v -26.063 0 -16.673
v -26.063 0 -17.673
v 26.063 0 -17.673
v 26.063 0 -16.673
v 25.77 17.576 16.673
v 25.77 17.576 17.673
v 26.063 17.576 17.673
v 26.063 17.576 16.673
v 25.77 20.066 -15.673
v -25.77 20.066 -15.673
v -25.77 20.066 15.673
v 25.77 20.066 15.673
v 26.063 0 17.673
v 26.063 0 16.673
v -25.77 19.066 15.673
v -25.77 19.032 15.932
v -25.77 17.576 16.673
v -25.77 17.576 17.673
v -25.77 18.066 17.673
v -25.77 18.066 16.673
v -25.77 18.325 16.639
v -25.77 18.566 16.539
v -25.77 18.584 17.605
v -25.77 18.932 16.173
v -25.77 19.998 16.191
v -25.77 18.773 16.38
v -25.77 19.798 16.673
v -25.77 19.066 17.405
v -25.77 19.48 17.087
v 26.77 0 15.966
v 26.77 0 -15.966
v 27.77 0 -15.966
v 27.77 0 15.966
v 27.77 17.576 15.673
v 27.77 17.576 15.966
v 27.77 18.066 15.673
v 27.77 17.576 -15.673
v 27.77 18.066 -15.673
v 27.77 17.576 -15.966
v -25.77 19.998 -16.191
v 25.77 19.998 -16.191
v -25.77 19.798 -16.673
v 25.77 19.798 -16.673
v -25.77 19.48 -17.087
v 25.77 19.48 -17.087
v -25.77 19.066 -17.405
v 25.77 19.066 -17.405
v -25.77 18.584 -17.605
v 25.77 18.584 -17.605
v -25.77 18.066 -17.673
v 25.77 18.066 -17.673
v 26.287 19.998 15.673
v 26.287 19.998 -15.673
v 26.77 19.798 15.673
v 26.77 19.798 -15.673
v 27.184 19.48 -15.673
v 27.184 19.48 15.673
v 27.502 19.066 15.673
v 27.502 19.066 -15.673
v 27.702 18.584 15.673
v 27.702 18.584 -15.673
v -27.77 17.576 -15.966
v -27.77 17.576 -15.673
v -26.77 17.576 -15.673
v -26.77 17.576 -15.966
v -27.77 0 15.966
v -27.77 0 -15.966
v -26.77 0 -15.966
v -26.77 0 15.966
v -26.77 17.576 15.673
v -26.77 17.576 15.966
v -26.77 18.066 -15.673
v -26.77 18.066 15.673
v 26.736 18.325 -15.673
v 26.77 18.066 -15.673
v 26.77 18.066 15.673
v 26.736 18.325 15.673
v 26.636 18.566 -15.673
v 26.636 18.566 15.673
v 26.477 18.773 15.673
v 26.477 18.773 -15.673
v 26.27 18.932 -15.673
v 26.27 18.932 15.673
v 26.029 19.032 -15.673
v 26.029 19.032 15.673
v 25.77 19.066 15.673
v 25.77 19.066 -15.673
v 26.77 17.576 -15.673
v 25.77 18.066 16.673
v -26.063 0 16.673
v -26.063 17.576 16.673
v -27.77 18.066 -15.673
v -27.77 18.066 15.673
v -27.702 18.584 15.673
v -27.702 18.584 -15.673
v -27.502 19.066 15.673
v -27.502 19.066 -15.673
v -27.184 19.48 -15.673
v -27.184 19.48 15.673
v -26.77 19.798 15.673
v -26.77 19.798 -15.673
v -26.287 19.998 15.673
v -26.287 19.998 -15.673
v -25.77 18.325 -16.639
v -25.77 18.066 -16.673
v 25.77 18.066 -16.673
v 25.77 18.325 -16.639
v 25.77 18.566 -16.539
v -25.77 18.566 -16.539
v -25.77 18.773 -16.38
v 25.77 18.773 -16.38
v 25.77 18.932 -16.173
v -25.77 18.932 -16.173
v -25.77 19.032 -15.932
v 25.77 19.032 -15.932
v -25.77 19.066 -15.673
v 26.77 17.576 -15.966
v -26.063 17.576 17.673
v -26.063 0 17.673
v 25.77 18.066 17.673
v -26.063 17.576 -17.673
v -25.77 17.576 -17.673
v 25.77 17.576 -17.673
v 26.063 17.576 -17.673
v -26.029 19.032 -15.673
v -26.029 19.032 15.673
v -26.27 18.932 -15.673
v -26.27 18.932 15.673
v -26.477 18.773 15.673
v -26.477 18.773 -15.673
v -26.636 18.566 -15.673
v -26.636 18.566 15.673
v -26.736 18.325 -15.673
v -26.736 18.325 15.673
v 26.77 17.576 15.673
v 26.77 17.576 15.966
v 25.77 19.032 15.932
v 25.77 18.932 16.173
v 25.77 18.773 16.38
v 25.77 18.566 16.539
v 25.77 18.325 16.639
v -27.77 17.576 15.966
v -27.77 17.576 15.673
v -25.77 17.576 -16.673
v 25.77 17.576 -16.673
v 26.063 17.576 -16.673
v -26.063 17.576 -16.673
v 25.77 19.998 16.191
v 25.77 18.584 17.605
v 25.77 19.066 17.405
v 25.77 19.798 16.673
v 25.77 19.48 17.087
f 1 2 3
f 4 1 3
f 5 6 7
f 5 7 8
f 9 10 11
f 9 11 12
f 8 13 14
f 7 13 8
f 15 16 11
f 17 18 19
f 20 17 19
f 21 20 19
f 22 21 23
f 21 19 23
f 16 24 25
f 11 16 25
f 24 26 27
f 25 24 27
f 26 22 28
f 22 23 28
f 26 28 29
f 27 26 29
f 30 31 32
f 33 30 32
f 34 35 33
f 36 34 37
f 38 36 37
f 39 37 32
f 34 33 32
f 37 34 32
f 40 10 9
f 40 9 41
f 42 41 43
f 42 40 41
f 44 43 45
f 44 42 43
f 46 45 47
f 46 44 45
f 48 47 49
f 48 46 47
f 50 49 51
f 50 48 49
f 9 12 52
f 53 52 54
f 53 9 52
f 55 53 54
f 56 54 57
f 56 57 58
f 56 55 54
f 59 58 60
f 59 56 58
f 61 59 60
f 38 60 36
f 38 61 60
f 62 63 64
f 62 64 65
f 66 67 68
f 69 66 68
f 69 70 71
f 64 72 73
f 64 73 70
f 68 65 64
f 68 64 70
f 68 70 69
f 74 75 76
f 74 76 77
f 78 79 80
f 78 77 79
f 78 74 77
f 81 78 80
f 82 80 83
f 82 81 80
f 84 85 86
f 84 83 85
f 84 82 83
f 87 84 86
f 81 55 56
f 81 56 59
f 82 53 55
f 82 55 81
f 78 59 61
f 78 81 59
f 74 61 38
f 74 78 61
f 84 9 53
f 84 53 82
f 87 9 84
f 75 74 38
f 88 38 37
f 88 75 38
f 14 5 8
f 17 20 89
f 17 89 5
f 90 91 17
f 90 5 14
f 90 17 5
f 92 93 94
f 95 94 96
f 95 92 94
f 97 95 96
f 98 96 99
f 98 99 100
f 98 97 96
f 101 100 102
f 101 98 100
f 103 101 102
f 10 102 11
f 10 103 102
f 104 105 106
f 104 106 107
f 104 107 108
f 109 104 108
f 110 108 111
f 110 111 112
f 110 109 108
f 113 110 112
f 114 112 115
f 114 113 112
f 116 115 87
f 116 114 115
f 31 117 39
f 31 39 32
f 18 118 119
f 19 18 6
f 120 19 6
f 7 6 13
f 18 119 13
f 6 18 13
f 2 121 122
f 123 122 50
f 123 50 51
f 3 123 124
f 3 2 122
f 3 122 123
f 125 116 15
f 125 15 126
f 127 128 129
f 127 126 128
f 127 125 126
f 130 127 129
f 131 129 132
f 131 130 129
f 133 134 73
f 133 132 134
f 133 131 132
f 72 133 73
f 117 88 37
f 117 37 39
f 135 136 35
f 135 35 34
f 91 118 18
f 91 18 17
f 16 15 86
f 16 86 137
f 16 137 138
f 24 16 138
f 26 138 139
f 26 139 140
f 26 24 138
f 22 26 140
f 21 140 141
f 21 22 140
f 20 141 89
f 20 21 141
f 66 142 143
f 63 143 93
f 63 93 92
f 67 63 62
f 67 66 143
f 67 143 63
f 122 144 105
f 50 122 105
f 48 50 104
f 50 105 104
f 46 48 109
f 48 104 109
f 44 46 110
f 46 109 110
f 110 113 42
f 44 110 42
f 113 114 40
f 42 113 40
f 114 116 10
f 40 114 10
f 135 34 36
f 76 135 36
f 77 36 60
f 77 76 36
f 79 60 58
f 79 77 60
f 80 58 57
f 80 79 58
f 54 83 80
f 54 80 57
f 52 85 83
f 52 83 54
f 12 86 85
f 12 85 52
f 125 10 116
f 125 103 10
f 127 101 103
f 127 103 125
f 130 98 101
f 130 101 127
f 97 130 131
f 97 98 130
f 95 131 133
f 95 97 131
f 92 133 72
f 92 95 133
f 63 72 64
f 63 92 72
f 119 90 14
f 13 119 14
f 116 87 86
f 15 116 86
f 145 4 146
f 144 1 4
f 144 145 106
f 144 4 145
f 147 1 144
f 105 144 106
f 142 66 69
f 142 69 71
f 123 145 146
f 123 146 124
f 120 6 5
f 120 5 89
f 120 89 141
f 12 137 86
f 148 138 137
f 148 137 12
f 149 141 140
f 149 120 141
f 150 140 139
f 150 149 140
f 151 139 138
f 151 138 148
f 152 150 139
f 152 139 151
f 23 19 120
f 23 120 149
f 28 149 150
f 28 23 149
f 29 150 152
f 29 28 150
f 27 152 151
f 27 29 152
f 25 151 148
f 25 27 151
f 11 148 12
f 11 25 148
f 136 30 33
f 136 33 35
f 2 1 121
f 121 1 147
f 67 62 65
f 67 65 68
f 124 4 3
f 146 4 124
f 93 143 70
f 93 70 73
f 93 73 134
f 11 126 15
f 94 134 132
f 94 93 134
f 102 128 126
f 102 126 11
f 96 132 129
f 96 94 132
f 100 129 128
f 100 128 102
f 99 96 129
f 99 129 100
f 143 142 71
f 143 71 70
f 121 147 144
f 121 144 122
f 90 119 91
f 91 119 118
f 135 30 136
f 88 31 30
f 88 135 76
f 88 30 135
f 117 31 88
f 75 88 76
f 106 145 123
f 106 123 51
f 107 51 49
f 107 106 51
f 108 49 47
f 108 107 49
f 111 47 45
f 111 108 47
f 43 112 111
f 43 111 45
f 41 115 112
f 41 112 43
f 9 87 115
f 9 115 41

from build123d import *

# Parameters (mm, degrees)
SKETCH2_W                = 55.53941402
SKETCH2_H                = 35.345852224
BOSS_EXTRUDE1_DEPTH      = 20.066
CONVERT_SOLID10_START    = -25.769706946
CONVERT_SOLID10_DEPTH    = 51.539413892
CONVERT_SOLID10_START_2  = -29
CONVERT_SOLID10_2_DEPTH  = 58
CONVERT_SOLID10_3_DEPTH  = 58
CONVERT_SOLID10_4_DEPTH  = 2.937399826
CONVERT_SOLID10_START_3  = 26.062600174
CONVERT_SOLID10_5_DEPTH  = 2.937399826
CONVERT_SOLID10_START_4  = -26.062600174
CONVERT_SOLID10_6_DEPTH  = 0.292893228
CONVERT_SOLID10_START_5  = 25.769706946
CONVERT_SOLID10_7_DEPTH  = 0.292893228
CONVERT_SOLID10_START_6  = -15.965819276
CONVERT_SOLID10_8_DEPTH  = 31.931638552
CONVERT_SOLID10_9_DEPTH  = 0.292893228
CONVERT_SOLID10_START_7  = 15.672926048
CONVERT_SOLID10_10_DEPTH = 0.292893228


with BuildPart() as part:
    # Sketch2 → Boss-Extrude1 (new body)
    with BuildSketch(Plane(origin=(0, 0, 0), x_dir=(1, 0, 0), z_dir=(0, 1, 0))):
        Rectangle(SKETCH2_W, SKETCH2_H)
    extrude(amount=BOSS_EXTRUDE1_DEPTH)

    # Convert-Solid10: read off the stored shape, not the designer's step
    # Convert-Solid10 outline → Convert-Solid10 (cut)
    with BuildSketch(Plane.YZ.offset(CONVERT_SOLID10_START)):
        with BuildLine():
            Line((0, 16.67292608), (0, -16.67292608))
            Line((0, -16.67292608), (18.065999936, -16.67292608))
            ThreePointArc((18.065999936, -16.67292608), (18.77310674, -16.380032852), (19.065999968, -15.672926048))
            Line((19.065999968, -15.672926048), (19.065999968, 15.672926048))
            ThreePointArc((19.065999968, 15.672926048), (18.77310674, 16.380032852), (18.065999936, 16.67292608))
            Line((18.065999936, 16.67292608), (0, 16.67292608))
        make_face()
    extrude(amount=CONVERT_SOLID10_DEPTH, mode=Mode.SUBTRACT)

    # Convert-Solid10 2 outline → Convert-Solid10 2 (cut)
    with BuildSketch(Plane.YZ.offset(CONVERT_SOLID10_START_2)):
        with BuildLine():
            Line((0, 15.965819276), (17.57580092, 15.965819276))
            Line((17.57580092, 15.965819276), (17.57580092, 15.672926048))
            Line((17.57580092, 15.672926048), (19.065999968, 15.672926048))
            ThreePointArc((19.065999968, 15.672926048), (18.77310674, 16.380032852), (18.065999936, 16.67292608))
            Line((18.065999936, 16.67292608), (0, 16.67292608))
            Line((0, 16.67292608), (0, 15.965819276))
        make_face()
        with BuildLine():
            Line((17.57580092, -15.965819276), (0, -15.965819276))
            Line((0, -15.965819276), (0, -16.67292608))
            Line((0, -16.67292608), (18.065999936, -16.67292608))
            ThreePointArc((18.065999936, -16.67292608), (18.77310674, -16.380032852), (19.065999968, -15.672926048))
            Line((19.065999968, -15.672926048), (17.57580092, -15.672926048))
            Line((17.57580092, -15.672926048), (17.57580092, -15.965819276))
        make_face()
    extrude(amount=CONVERT_SOLID10_2_DEPTH, mode=Mode.SUBTRACT)

    # Convert-Solid10 3 outline → Convert-Solid10 3 (cut)
    with BuildSketch(Plane.YZ.offset(CONVERT_SOLID10_START_2)):
        with BuildLine():
            Line((20.066, 17.672926112), (18.065999936, 17.672926112))
            ThreePointArc((18.065999936, 17.672926112), (19.480213544, 17.087139656), (20.066, 15.672926048))
            Line((20.066, 15.672926048), (20.066, 17.672926112))
        make_face()
        with BuildLine():
            Line((20.066, -17.672926112), (20.066, -15.672926048))
            ThreePointArc((20.066, -15.672926048), (19.480213544, -17.087139656), (18.065999936, -17.672926112))
            Line((18.065999936, -17.672926112), (20.066, -17.672926112))
        make_face()
    extrude(amount=CONVERT_SOLID10_3_DEPTH, mode=Mode.SUBTRACT)

    # Convert-Solid10 4 outline → Convert-Solid10 4 (cut)
    with BuildSketch(Plane.YZ.offset(CONVERT_SOLID10_START_2)):
        with BuildLine():
            Line((0, 16.67292608), (18.065999936, 16.67292608))
            ThreePointArc((18.065999936, 16.67292608), (18.77310674, 16.380032852), (19.065999968, 15.672926048))
            Line((19.065999968, 15.672926048), (20.066, 15.672926048))
            ThreePointArc((20.066, 15.672926048), (19.480213544, 17.087139656), (18.065999936, 17.672926112))
            Line((18.065999936, 17.672926112), (0, 17.672926112))
            Line((0, 17.672926112), (0, 16.67292608))
        make_face()
        with BuildLine():
            ThreePointArc((18.065999936, -17.672926112), (19.480213544, -17.087139656), (20.066, -15.672926048))
            Line((20.066, -15.672926048), (19.065999968, -15.672926048))
            ThreePointArc((19.065999968, -15.672926048), (18.77310674, -16.380032852), (18.065999936, -16.67292608))
            Line((18.065999936, -16.67292608), (0, -16.67292608))
            Line((0, -16.67292608), (0, -17.672926112))
            Line((0, -17.672926112), (18.065999936, -17.672926112))
        make_face()
    extrude(amount=CONVERT_SOLID10_4_DEPTH, mode=Mode.SUBTRACT)

    # Convert-Solid10 5 outline → Convert-Solid10 5 (cut)
    with BuildSketch(Plane.YZ.offset(CONVERT_SOLID10_START_3)):
        with BuildLine():
            Line((0, 16.67292608), (18.065999936, 16.67292608))
            ThreePointArc((18.065999936, 16.67292608), (18.77310674, 16.380032852), (19.065999968, 15.672926048))
            Line((19.065999968, 15.672926048), (20.066, 15.672926048))
            ThreePointArc((20.066, 15.672926048), (19.480213544, 17.087139656), (18.065999936, 17.672926112))
            Line((18.065999936, 17.672926112), (0, 17.672926112))
            Line((0, 17.672926112), (0, 16.67292608))
        make_face()
        with BuildLine():
            ThreePointArc((18.065999936, -17.672926112), (19.480213544, -17.087139656), (20.066, -15.672926048))
            Line((20.066, -15.672926048), (19.065999968, -15.672926048))
            ThreePointArc((19.065999968, -15.672926048), (18.77310674, -16.380032852), (18.065999936, -16.67292608))
            Line((18.065999936, -16.67292608), (0, -16.67292608))
            Line((0, -16.67292608), (0, -17.672926112))
            Line((0, -17.672926112), (18.065999936, -17.672926112))
        make_face()
    extrude(amount=CONVERT_SOLID10_5_DEPTH, mode=Mode.SUBTRACT)

    # Convert-Solid10 6 outline → Convert-Solid10 6 (cut)
    with BuildSketch(Plane.YZ.offset(CONVERT_SOLID10_START_4)):
        with BuildLine():
            Line((17.57580092, 17.672926112), (17.57580092, 16.67292608))
            Line((17.57580092, 16.67292608), (18.065999936, 16.67292608))
            ThreePointArc((18.065999936, 16.67292608), (18.77310674, 16.380032852), (19.065999968, 15.672926048))
            Line((19.065999968, 15.672926048), (20.066, 15.672926048))
            ThreePointArc((20.066, 15.672926048), (19.480213544, 17.087139656), (18.065999936, 17.672926112))
            Line((18.065999936, 17.672926112), (17.57580092, 17.672926112))
        make_face()
        with BuildLine():
            ThreePointArc((18.065999936, -17.672926112), (19.480213544, -17.087139656), (20.066, -15.672926048))
            Line((20.066, -15.672926048), (19.065999968, -15.672926048))
            ThreePointArc((19.065999968, -15.672926048), (18.77310674, -16.380032852), (18.065999936, -16.67292608))
            Line((18.065999936, -16.67292608), (17.57580092, -16.67292608))
            Line((17.57580092, -16.67292608), (17.57580092, -17.672926112))
            Line((17.57580092, -17.672926112), (18.065999936, -17.672926112))
        make_face()
    extrude(amount=CONVERT_SOLID10_6_DEPTH, mode=Mode.SUBTRACT)

    # Convert-Solid10 7 outline → Convert-Solid10 7 (cut)
    with BuildSketch(Plane.YZ.offset(CONVERT_SOLID10_START_5)):
        with BuildLine():
            Line((17.57580092, 17.672926112), (17.57580092, 16.67292608))
            Line((17.57580092, 16.67292608), (18.065999936, 16.67292608))
            ThreePointArc((18.065999936, 16.67292608), (18.77310674, 16.380032852), (19.065999968, 15.672926048))
            Line((19.065999968, 15.672926048), (20.066, 15.672926048))
            ThreePointArc((20.066, 15.672926048), (19.480213544, 17.087139656), (18.065999936, 17.672926112))
            Line((18.065999936, 17.672926112), (17.57580092, 17.672926112))
        make_face()
        with BuildLine():
            ThreePointArc((18.065999936, -17.672926112), (19.480213544, -17.087139656), (20.066, -15.672926048))
            Line((20.066, -15.672926048), (19.065999968, -15.672926048))
            ThreePointArc((19.065999968, -15.672926048), (18.77310674, -16.380032852), (18.065999936, -16.67292608))
            Line((18.065999936, -16.67292608), (17.57580092, -16.67292608))
            Line((17.57580092, -16.67292608), (17.57580092, -17.672926112))
            Line((17.57580092, -17.672926112), (18.065999936, -17.672926112))
        make_face()
    extrude(amount=CONVERT_SOLID10_7_DEPTH, mode=Mode.SUBTRACT)

    # Convert-Solid10 8 outline → Convert-Solid10 8 (cut)
    with BuildSketch(Plane.XY.offset(CONVERT_SOLID10_START_6)):
        with BuildLine():
            Line((-27.76970701, 20.066), (-27.76970701, 18.065999936))
            ThreePointArc((-27.76970701, 18.065999936), (-27.183920554, 19.480213544), (-25.769706946, 20.066))
            Line((-25.769706946, 20.066), (-27.76970701, 20.066))
        make_face()
        with BuildLine():
            Line((27.76970701, 20.066), (25.769706946, 20.066))
            ThreePointArc((25.769706946, 20.066), (27.183920554, 19.480213544), (27.76970701, 18.065999936))
            Line((27.76970701, 18.065999936), (27.76970701, 20.066))
        make_face()
        with BuildLine():
            ThreePointArc((-25.769706946, 19.065999968), (-26.47681375, 18.77310674), (-26.769706978, 18.065999936))
            Line((-26.769706978, 18.065999936), (-26.769706978, 0))
            Line((-26.769706978, 0), (-25.769706946, 0))
            Line((-25.769706946, 0), (-25.769706946, 19.065999968))
        make_face()
        with BuildLine():
            ThreePointArc((26.769706978, 18.065999936), (26.47681375, 18.77310674), (25.769706946, 19.065999968))
            Line((25.769706946, 19.065999968), (25.769706946, 0))
            Line((25.769706946, 0), (26.769706978, 0))
            Line((26.769706978, 0), (26.769706978, 18.065999936))
        make_face()
    extrude(amount=CONVERT_SOLID10_8_DEPTH, mode=Mode.SUBTRACT)

    # Convert-Solid10 9 outline → Convert-Solid10 9 (cut)
    with BuildSketch(Plane.XY.offset(CONVERT_SOLID10_START_6)):
        with BuildLine():
            ThreePointArc((-25.769706946, 20.066), (-27.183920554, 19.480213544), (-27.76970701, 18.065999936))
            Line((-27.76970701, 18.065999936), (-27.76970701, 17.57580092))
            Line((-27.76970701, 17.57580092), (-26.769706978, 17.57580092))
            Line((-26.769706978, 17.57580092), (-26.769706978, 18.065999936))
            ThreePointArc((-26.769706978, 18.065999936), (-26.47681375, 18.77310674), (-25.769706946, 19.065999968))
            Line((-25.769706946, 19.065999968), (-25.769706946, 20.066))
        make_face()
        with BuildLine():
            ThreePointArc((27.76970701, 18.065999936), (27.183920554, 19.480213544), (25.769706946, 20.066))
            Line((25.769706946, 20.066), (25.769706946, 19.065999968))
            ThreePointArc((25.769706946, 19.065999968), (26.47681375, 18.77310674), (26.769706978, 18.065999936))
            Line((26.769706978, 18.065999936), (26.769706978, 17.57580092))
            Line((26.769706978, 17.57580092), (27.76970701, 17.57580092))
            Line((27.76970701, 17.57580092), (27.76970701, 18.065999936))
        make_face()
    extrude(amount=CONVERT_SOLID10_9_DEPTH, mode=Mode.SUBTRACT)

    # Convert-Solid10 10 outline → Convert-Solid10 10 (cut)
    with BuildSketch(Plane.XY.offset(CONVERT_SOLID10_START_7)):
        with BuildLine():
            ThreePointArc((-25.769706946, 20.066), (-27.183920554, 19.480213544), (-27.76970701, 18.065999936))
            Line((-27.76970701, 18.065999936), (-27.76970701, 17.57580092))
            Line((-27.76970701, 17.57580092), (-26.769706978, 17.57580092))
            Line((-26.769706978, 17.57580092), (-26.769706978, 18.065999936))
            ThreePointArc((-26.769706978, 18.065999936), (-26.47681375, 18.77310674), (-25.769706946, 19.065999968))
            Line((-25.769706946, 19.065999968), (-25.769706946, 20.066))
        make_face()
        with BuildLine():
            ThreePointArc((27.76970701, 18.065999936), (27.183920554, 19.480213544), (25.769706946, 20.066))
            Line((25.769706946, 20.066), (25.769706946, 19.065999968))
            ThreePointArc((25.769706946, 19.065999968), (26.47681375, 18.77310674), (26.769706978, 18.065999936))
            Line((26.769706978, 18.065999936), (26.769706978, 17.57580092))
            Line((26.769706978, 17.57580092), (27.76970701, 17.57580092))
            Line((27.76970701, 17.57580092), (27.76970701, 18.065999936))
        make_face()
    extrude(amount=CONVERT_SOLID10_10_DEPTH, mode=Mode.SUBTRACT)


solid = part.part
